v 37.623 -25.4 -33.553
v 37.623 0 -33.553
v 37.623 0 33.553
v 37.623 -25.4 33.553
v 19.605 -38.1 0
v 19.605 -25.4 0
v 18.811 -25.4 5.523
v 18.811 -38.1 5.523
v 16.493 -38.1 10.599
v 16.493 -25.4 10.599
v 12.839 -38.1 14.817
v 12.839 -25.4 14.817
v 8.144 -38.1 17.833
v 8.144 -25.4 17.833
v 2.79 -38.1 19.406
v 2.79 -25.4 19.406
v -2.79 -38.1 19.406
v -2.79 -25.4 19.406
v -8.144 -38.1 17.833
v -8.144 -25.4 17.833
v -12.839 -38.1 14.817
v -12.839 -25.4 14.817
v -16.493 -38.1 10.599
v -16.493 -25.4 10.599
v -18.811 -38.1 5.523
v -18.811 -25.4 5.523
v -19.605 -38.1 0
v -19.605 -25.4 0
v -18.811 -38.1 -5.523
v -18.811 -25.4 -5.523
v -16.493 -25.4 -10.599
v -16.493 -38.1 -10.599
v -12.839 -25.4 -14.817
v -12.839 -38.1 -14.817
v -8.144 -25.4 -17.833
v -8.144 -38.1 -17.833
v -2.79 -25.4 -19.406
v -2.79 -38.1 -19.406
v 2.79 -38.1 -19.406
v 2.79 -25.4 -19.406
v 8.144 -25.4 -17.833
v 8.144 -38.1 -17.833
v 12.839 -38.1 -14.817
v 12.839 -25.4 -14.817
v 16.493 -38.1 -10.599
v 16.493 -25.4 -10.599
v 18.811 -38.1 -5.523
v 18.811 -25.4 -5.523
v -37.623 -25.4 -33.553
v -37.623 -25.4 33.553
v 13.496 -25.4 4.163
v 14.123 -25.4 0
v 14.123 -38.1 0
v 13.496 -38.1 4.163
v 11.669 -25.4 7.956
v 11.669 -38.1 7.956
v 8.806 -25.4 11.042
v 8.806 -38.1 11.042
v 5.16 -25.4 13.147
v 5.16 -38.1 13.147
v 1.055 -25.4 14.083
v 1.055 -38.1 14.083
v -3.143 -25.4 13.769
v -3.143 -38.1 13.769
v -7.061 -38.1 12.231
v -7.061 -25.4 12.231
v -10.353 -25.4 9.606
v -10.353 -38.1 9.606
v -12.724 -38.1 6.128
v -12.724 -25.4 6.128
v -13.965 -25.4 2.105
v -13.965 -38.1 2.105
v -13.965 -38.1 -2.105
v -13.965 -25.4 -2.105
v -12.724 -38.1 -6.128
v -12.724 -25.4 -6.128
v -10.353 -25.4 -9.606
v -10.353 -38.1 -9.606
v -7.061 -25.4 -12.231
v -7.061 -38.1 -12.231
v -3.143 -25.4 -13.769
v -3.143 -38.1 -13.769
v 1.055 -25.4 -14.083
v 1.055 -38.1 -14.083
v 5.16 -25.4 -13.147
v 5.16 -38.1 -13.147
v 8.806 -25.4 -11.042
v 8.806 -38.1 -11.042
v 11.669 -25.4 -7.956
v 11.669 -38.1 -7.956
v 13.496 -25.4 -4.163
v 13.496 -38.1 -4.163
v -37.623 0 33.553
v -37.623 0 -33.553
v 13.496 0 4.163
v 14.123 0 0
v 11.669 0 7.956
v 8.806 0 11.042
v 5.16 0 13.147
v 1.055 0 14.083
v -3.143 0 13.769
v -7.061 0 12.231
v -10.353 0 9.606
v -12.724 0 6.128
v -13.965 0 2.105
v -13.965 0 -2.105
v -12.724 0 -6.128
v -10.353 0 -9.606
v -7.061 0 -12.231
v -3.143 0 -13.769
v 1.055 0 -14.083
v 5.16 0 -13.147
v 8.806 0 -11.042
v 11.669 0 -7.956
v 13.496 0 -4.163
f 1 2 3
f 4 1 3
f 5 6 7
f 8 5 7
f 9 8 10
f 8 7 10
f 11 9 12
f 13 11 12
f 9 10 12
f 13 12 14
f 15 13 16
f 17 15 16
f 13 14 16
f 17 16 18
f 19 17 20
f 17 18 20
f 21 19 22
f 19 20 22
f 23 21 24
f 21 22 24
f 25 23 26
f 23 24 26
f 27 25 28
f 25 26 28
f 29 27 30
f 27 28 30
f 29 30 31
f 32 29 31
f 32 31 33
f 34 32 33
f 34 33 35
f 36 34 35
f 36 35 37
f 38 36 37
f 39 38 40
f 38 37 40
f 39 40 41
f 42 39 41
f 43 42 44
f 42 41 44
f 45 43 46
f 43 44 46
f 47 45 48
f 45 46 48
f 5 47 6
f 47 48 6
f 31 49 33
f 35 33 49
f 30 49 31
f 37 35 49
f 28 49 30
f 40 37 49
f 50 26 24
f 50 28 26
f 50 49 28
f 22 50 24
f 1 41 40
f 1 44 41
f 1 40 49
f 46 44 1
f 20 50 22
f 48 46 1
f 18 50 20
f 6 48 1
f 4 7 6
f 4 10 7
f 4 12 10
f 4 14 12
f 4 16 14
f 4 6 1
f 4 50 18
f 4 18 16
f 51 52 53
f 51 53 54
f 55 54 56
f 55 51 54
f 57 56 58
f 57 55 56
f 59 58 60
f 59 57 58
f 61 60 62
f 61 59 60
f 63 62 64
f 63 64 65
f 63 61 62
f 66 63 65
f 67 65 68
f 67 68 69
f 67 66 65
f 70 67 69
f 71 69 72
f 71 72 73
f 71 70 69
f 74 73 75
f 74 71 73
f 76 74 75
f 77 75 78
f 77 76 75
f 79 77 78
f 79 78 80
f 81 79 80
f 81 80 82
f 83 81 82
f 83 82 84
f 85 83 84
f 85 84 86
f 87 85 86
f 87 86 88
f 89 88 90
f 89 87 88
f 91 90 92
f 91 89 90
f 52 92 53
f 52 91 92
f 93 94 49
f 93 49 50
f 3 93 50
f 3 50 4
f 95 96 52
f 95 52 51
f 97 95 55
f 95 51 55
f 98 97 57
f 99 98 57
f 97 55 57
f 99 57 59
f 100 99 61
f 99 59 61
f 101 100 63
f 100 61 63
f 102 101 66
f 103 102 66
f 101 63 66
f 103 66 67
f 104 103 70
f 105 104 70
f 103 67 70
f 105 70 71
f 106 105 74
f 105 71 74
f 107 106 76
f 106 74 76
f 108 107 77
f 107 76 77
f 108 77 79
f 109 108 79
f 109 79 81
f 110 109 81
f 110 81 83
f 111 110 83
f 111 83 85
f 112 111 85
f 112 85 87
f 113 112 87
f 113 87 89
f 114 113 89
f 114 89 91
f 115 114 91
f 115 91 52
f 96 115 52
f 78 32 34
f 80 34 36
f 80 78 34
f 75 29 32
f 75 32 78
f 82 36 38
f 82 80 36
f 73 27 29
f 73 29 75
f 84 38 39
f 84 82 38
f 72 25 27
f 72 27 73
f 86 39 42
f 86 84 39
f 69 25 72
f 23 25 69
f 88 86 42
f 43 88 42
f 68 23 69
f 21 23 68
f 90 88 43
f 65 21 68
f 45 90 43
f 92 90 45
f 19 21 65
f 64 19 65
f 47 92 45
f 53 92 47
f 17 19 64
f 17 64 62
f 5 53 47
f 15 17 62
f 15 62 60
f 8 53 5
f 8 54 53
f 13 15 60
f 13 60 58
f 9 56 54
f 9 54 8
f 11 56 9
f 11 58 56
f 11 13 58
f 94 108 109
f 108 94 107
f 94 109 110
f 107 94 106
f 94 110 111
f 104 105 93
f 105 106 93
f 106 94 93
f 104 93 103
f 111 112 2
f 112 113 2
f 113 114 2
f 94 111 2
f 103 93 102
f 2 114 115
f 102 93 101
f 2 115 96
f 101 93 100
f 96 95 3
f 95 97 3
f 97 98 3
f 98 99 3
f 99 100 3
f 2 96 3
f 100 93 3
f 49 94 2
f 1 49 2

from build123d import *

# Parameters (mm, degrees)
F0_W     = 75.245142
F0_H     = 67.105166
F1_DEPTH = 25.4
F2_R     = 14.122943
F3_DEPTH = 25.401
F2_R_2   = 19.605115
F4_DEPTH = 12.7


with BuildPart() as f1:
    # F0 (on Front) → F1 (new body)
    with BuildSketch(Plane.XZ):
        Rectangle(F0_W, F0_H)
    extrude(amount=F1_DEPTH)

    # F2 (on face) → F3 (cut, through all)
    with BuildSketch(Plane.XZ.offset(25.4)):
        Circle(F2_R)
    extrude(amount=-F3_DEPTH, mode=Mode.SUBTRACT)

    # F2 (on face) → F4 (join)
    with BuildSketch(Plane.XZ.offset(25.4)):
        Circle(F2_R_2)
        Circle(F2_R, mode=Mode.SUBTRACT)
    extrude(amount=F4_DEPTH)


solid = f1.part
